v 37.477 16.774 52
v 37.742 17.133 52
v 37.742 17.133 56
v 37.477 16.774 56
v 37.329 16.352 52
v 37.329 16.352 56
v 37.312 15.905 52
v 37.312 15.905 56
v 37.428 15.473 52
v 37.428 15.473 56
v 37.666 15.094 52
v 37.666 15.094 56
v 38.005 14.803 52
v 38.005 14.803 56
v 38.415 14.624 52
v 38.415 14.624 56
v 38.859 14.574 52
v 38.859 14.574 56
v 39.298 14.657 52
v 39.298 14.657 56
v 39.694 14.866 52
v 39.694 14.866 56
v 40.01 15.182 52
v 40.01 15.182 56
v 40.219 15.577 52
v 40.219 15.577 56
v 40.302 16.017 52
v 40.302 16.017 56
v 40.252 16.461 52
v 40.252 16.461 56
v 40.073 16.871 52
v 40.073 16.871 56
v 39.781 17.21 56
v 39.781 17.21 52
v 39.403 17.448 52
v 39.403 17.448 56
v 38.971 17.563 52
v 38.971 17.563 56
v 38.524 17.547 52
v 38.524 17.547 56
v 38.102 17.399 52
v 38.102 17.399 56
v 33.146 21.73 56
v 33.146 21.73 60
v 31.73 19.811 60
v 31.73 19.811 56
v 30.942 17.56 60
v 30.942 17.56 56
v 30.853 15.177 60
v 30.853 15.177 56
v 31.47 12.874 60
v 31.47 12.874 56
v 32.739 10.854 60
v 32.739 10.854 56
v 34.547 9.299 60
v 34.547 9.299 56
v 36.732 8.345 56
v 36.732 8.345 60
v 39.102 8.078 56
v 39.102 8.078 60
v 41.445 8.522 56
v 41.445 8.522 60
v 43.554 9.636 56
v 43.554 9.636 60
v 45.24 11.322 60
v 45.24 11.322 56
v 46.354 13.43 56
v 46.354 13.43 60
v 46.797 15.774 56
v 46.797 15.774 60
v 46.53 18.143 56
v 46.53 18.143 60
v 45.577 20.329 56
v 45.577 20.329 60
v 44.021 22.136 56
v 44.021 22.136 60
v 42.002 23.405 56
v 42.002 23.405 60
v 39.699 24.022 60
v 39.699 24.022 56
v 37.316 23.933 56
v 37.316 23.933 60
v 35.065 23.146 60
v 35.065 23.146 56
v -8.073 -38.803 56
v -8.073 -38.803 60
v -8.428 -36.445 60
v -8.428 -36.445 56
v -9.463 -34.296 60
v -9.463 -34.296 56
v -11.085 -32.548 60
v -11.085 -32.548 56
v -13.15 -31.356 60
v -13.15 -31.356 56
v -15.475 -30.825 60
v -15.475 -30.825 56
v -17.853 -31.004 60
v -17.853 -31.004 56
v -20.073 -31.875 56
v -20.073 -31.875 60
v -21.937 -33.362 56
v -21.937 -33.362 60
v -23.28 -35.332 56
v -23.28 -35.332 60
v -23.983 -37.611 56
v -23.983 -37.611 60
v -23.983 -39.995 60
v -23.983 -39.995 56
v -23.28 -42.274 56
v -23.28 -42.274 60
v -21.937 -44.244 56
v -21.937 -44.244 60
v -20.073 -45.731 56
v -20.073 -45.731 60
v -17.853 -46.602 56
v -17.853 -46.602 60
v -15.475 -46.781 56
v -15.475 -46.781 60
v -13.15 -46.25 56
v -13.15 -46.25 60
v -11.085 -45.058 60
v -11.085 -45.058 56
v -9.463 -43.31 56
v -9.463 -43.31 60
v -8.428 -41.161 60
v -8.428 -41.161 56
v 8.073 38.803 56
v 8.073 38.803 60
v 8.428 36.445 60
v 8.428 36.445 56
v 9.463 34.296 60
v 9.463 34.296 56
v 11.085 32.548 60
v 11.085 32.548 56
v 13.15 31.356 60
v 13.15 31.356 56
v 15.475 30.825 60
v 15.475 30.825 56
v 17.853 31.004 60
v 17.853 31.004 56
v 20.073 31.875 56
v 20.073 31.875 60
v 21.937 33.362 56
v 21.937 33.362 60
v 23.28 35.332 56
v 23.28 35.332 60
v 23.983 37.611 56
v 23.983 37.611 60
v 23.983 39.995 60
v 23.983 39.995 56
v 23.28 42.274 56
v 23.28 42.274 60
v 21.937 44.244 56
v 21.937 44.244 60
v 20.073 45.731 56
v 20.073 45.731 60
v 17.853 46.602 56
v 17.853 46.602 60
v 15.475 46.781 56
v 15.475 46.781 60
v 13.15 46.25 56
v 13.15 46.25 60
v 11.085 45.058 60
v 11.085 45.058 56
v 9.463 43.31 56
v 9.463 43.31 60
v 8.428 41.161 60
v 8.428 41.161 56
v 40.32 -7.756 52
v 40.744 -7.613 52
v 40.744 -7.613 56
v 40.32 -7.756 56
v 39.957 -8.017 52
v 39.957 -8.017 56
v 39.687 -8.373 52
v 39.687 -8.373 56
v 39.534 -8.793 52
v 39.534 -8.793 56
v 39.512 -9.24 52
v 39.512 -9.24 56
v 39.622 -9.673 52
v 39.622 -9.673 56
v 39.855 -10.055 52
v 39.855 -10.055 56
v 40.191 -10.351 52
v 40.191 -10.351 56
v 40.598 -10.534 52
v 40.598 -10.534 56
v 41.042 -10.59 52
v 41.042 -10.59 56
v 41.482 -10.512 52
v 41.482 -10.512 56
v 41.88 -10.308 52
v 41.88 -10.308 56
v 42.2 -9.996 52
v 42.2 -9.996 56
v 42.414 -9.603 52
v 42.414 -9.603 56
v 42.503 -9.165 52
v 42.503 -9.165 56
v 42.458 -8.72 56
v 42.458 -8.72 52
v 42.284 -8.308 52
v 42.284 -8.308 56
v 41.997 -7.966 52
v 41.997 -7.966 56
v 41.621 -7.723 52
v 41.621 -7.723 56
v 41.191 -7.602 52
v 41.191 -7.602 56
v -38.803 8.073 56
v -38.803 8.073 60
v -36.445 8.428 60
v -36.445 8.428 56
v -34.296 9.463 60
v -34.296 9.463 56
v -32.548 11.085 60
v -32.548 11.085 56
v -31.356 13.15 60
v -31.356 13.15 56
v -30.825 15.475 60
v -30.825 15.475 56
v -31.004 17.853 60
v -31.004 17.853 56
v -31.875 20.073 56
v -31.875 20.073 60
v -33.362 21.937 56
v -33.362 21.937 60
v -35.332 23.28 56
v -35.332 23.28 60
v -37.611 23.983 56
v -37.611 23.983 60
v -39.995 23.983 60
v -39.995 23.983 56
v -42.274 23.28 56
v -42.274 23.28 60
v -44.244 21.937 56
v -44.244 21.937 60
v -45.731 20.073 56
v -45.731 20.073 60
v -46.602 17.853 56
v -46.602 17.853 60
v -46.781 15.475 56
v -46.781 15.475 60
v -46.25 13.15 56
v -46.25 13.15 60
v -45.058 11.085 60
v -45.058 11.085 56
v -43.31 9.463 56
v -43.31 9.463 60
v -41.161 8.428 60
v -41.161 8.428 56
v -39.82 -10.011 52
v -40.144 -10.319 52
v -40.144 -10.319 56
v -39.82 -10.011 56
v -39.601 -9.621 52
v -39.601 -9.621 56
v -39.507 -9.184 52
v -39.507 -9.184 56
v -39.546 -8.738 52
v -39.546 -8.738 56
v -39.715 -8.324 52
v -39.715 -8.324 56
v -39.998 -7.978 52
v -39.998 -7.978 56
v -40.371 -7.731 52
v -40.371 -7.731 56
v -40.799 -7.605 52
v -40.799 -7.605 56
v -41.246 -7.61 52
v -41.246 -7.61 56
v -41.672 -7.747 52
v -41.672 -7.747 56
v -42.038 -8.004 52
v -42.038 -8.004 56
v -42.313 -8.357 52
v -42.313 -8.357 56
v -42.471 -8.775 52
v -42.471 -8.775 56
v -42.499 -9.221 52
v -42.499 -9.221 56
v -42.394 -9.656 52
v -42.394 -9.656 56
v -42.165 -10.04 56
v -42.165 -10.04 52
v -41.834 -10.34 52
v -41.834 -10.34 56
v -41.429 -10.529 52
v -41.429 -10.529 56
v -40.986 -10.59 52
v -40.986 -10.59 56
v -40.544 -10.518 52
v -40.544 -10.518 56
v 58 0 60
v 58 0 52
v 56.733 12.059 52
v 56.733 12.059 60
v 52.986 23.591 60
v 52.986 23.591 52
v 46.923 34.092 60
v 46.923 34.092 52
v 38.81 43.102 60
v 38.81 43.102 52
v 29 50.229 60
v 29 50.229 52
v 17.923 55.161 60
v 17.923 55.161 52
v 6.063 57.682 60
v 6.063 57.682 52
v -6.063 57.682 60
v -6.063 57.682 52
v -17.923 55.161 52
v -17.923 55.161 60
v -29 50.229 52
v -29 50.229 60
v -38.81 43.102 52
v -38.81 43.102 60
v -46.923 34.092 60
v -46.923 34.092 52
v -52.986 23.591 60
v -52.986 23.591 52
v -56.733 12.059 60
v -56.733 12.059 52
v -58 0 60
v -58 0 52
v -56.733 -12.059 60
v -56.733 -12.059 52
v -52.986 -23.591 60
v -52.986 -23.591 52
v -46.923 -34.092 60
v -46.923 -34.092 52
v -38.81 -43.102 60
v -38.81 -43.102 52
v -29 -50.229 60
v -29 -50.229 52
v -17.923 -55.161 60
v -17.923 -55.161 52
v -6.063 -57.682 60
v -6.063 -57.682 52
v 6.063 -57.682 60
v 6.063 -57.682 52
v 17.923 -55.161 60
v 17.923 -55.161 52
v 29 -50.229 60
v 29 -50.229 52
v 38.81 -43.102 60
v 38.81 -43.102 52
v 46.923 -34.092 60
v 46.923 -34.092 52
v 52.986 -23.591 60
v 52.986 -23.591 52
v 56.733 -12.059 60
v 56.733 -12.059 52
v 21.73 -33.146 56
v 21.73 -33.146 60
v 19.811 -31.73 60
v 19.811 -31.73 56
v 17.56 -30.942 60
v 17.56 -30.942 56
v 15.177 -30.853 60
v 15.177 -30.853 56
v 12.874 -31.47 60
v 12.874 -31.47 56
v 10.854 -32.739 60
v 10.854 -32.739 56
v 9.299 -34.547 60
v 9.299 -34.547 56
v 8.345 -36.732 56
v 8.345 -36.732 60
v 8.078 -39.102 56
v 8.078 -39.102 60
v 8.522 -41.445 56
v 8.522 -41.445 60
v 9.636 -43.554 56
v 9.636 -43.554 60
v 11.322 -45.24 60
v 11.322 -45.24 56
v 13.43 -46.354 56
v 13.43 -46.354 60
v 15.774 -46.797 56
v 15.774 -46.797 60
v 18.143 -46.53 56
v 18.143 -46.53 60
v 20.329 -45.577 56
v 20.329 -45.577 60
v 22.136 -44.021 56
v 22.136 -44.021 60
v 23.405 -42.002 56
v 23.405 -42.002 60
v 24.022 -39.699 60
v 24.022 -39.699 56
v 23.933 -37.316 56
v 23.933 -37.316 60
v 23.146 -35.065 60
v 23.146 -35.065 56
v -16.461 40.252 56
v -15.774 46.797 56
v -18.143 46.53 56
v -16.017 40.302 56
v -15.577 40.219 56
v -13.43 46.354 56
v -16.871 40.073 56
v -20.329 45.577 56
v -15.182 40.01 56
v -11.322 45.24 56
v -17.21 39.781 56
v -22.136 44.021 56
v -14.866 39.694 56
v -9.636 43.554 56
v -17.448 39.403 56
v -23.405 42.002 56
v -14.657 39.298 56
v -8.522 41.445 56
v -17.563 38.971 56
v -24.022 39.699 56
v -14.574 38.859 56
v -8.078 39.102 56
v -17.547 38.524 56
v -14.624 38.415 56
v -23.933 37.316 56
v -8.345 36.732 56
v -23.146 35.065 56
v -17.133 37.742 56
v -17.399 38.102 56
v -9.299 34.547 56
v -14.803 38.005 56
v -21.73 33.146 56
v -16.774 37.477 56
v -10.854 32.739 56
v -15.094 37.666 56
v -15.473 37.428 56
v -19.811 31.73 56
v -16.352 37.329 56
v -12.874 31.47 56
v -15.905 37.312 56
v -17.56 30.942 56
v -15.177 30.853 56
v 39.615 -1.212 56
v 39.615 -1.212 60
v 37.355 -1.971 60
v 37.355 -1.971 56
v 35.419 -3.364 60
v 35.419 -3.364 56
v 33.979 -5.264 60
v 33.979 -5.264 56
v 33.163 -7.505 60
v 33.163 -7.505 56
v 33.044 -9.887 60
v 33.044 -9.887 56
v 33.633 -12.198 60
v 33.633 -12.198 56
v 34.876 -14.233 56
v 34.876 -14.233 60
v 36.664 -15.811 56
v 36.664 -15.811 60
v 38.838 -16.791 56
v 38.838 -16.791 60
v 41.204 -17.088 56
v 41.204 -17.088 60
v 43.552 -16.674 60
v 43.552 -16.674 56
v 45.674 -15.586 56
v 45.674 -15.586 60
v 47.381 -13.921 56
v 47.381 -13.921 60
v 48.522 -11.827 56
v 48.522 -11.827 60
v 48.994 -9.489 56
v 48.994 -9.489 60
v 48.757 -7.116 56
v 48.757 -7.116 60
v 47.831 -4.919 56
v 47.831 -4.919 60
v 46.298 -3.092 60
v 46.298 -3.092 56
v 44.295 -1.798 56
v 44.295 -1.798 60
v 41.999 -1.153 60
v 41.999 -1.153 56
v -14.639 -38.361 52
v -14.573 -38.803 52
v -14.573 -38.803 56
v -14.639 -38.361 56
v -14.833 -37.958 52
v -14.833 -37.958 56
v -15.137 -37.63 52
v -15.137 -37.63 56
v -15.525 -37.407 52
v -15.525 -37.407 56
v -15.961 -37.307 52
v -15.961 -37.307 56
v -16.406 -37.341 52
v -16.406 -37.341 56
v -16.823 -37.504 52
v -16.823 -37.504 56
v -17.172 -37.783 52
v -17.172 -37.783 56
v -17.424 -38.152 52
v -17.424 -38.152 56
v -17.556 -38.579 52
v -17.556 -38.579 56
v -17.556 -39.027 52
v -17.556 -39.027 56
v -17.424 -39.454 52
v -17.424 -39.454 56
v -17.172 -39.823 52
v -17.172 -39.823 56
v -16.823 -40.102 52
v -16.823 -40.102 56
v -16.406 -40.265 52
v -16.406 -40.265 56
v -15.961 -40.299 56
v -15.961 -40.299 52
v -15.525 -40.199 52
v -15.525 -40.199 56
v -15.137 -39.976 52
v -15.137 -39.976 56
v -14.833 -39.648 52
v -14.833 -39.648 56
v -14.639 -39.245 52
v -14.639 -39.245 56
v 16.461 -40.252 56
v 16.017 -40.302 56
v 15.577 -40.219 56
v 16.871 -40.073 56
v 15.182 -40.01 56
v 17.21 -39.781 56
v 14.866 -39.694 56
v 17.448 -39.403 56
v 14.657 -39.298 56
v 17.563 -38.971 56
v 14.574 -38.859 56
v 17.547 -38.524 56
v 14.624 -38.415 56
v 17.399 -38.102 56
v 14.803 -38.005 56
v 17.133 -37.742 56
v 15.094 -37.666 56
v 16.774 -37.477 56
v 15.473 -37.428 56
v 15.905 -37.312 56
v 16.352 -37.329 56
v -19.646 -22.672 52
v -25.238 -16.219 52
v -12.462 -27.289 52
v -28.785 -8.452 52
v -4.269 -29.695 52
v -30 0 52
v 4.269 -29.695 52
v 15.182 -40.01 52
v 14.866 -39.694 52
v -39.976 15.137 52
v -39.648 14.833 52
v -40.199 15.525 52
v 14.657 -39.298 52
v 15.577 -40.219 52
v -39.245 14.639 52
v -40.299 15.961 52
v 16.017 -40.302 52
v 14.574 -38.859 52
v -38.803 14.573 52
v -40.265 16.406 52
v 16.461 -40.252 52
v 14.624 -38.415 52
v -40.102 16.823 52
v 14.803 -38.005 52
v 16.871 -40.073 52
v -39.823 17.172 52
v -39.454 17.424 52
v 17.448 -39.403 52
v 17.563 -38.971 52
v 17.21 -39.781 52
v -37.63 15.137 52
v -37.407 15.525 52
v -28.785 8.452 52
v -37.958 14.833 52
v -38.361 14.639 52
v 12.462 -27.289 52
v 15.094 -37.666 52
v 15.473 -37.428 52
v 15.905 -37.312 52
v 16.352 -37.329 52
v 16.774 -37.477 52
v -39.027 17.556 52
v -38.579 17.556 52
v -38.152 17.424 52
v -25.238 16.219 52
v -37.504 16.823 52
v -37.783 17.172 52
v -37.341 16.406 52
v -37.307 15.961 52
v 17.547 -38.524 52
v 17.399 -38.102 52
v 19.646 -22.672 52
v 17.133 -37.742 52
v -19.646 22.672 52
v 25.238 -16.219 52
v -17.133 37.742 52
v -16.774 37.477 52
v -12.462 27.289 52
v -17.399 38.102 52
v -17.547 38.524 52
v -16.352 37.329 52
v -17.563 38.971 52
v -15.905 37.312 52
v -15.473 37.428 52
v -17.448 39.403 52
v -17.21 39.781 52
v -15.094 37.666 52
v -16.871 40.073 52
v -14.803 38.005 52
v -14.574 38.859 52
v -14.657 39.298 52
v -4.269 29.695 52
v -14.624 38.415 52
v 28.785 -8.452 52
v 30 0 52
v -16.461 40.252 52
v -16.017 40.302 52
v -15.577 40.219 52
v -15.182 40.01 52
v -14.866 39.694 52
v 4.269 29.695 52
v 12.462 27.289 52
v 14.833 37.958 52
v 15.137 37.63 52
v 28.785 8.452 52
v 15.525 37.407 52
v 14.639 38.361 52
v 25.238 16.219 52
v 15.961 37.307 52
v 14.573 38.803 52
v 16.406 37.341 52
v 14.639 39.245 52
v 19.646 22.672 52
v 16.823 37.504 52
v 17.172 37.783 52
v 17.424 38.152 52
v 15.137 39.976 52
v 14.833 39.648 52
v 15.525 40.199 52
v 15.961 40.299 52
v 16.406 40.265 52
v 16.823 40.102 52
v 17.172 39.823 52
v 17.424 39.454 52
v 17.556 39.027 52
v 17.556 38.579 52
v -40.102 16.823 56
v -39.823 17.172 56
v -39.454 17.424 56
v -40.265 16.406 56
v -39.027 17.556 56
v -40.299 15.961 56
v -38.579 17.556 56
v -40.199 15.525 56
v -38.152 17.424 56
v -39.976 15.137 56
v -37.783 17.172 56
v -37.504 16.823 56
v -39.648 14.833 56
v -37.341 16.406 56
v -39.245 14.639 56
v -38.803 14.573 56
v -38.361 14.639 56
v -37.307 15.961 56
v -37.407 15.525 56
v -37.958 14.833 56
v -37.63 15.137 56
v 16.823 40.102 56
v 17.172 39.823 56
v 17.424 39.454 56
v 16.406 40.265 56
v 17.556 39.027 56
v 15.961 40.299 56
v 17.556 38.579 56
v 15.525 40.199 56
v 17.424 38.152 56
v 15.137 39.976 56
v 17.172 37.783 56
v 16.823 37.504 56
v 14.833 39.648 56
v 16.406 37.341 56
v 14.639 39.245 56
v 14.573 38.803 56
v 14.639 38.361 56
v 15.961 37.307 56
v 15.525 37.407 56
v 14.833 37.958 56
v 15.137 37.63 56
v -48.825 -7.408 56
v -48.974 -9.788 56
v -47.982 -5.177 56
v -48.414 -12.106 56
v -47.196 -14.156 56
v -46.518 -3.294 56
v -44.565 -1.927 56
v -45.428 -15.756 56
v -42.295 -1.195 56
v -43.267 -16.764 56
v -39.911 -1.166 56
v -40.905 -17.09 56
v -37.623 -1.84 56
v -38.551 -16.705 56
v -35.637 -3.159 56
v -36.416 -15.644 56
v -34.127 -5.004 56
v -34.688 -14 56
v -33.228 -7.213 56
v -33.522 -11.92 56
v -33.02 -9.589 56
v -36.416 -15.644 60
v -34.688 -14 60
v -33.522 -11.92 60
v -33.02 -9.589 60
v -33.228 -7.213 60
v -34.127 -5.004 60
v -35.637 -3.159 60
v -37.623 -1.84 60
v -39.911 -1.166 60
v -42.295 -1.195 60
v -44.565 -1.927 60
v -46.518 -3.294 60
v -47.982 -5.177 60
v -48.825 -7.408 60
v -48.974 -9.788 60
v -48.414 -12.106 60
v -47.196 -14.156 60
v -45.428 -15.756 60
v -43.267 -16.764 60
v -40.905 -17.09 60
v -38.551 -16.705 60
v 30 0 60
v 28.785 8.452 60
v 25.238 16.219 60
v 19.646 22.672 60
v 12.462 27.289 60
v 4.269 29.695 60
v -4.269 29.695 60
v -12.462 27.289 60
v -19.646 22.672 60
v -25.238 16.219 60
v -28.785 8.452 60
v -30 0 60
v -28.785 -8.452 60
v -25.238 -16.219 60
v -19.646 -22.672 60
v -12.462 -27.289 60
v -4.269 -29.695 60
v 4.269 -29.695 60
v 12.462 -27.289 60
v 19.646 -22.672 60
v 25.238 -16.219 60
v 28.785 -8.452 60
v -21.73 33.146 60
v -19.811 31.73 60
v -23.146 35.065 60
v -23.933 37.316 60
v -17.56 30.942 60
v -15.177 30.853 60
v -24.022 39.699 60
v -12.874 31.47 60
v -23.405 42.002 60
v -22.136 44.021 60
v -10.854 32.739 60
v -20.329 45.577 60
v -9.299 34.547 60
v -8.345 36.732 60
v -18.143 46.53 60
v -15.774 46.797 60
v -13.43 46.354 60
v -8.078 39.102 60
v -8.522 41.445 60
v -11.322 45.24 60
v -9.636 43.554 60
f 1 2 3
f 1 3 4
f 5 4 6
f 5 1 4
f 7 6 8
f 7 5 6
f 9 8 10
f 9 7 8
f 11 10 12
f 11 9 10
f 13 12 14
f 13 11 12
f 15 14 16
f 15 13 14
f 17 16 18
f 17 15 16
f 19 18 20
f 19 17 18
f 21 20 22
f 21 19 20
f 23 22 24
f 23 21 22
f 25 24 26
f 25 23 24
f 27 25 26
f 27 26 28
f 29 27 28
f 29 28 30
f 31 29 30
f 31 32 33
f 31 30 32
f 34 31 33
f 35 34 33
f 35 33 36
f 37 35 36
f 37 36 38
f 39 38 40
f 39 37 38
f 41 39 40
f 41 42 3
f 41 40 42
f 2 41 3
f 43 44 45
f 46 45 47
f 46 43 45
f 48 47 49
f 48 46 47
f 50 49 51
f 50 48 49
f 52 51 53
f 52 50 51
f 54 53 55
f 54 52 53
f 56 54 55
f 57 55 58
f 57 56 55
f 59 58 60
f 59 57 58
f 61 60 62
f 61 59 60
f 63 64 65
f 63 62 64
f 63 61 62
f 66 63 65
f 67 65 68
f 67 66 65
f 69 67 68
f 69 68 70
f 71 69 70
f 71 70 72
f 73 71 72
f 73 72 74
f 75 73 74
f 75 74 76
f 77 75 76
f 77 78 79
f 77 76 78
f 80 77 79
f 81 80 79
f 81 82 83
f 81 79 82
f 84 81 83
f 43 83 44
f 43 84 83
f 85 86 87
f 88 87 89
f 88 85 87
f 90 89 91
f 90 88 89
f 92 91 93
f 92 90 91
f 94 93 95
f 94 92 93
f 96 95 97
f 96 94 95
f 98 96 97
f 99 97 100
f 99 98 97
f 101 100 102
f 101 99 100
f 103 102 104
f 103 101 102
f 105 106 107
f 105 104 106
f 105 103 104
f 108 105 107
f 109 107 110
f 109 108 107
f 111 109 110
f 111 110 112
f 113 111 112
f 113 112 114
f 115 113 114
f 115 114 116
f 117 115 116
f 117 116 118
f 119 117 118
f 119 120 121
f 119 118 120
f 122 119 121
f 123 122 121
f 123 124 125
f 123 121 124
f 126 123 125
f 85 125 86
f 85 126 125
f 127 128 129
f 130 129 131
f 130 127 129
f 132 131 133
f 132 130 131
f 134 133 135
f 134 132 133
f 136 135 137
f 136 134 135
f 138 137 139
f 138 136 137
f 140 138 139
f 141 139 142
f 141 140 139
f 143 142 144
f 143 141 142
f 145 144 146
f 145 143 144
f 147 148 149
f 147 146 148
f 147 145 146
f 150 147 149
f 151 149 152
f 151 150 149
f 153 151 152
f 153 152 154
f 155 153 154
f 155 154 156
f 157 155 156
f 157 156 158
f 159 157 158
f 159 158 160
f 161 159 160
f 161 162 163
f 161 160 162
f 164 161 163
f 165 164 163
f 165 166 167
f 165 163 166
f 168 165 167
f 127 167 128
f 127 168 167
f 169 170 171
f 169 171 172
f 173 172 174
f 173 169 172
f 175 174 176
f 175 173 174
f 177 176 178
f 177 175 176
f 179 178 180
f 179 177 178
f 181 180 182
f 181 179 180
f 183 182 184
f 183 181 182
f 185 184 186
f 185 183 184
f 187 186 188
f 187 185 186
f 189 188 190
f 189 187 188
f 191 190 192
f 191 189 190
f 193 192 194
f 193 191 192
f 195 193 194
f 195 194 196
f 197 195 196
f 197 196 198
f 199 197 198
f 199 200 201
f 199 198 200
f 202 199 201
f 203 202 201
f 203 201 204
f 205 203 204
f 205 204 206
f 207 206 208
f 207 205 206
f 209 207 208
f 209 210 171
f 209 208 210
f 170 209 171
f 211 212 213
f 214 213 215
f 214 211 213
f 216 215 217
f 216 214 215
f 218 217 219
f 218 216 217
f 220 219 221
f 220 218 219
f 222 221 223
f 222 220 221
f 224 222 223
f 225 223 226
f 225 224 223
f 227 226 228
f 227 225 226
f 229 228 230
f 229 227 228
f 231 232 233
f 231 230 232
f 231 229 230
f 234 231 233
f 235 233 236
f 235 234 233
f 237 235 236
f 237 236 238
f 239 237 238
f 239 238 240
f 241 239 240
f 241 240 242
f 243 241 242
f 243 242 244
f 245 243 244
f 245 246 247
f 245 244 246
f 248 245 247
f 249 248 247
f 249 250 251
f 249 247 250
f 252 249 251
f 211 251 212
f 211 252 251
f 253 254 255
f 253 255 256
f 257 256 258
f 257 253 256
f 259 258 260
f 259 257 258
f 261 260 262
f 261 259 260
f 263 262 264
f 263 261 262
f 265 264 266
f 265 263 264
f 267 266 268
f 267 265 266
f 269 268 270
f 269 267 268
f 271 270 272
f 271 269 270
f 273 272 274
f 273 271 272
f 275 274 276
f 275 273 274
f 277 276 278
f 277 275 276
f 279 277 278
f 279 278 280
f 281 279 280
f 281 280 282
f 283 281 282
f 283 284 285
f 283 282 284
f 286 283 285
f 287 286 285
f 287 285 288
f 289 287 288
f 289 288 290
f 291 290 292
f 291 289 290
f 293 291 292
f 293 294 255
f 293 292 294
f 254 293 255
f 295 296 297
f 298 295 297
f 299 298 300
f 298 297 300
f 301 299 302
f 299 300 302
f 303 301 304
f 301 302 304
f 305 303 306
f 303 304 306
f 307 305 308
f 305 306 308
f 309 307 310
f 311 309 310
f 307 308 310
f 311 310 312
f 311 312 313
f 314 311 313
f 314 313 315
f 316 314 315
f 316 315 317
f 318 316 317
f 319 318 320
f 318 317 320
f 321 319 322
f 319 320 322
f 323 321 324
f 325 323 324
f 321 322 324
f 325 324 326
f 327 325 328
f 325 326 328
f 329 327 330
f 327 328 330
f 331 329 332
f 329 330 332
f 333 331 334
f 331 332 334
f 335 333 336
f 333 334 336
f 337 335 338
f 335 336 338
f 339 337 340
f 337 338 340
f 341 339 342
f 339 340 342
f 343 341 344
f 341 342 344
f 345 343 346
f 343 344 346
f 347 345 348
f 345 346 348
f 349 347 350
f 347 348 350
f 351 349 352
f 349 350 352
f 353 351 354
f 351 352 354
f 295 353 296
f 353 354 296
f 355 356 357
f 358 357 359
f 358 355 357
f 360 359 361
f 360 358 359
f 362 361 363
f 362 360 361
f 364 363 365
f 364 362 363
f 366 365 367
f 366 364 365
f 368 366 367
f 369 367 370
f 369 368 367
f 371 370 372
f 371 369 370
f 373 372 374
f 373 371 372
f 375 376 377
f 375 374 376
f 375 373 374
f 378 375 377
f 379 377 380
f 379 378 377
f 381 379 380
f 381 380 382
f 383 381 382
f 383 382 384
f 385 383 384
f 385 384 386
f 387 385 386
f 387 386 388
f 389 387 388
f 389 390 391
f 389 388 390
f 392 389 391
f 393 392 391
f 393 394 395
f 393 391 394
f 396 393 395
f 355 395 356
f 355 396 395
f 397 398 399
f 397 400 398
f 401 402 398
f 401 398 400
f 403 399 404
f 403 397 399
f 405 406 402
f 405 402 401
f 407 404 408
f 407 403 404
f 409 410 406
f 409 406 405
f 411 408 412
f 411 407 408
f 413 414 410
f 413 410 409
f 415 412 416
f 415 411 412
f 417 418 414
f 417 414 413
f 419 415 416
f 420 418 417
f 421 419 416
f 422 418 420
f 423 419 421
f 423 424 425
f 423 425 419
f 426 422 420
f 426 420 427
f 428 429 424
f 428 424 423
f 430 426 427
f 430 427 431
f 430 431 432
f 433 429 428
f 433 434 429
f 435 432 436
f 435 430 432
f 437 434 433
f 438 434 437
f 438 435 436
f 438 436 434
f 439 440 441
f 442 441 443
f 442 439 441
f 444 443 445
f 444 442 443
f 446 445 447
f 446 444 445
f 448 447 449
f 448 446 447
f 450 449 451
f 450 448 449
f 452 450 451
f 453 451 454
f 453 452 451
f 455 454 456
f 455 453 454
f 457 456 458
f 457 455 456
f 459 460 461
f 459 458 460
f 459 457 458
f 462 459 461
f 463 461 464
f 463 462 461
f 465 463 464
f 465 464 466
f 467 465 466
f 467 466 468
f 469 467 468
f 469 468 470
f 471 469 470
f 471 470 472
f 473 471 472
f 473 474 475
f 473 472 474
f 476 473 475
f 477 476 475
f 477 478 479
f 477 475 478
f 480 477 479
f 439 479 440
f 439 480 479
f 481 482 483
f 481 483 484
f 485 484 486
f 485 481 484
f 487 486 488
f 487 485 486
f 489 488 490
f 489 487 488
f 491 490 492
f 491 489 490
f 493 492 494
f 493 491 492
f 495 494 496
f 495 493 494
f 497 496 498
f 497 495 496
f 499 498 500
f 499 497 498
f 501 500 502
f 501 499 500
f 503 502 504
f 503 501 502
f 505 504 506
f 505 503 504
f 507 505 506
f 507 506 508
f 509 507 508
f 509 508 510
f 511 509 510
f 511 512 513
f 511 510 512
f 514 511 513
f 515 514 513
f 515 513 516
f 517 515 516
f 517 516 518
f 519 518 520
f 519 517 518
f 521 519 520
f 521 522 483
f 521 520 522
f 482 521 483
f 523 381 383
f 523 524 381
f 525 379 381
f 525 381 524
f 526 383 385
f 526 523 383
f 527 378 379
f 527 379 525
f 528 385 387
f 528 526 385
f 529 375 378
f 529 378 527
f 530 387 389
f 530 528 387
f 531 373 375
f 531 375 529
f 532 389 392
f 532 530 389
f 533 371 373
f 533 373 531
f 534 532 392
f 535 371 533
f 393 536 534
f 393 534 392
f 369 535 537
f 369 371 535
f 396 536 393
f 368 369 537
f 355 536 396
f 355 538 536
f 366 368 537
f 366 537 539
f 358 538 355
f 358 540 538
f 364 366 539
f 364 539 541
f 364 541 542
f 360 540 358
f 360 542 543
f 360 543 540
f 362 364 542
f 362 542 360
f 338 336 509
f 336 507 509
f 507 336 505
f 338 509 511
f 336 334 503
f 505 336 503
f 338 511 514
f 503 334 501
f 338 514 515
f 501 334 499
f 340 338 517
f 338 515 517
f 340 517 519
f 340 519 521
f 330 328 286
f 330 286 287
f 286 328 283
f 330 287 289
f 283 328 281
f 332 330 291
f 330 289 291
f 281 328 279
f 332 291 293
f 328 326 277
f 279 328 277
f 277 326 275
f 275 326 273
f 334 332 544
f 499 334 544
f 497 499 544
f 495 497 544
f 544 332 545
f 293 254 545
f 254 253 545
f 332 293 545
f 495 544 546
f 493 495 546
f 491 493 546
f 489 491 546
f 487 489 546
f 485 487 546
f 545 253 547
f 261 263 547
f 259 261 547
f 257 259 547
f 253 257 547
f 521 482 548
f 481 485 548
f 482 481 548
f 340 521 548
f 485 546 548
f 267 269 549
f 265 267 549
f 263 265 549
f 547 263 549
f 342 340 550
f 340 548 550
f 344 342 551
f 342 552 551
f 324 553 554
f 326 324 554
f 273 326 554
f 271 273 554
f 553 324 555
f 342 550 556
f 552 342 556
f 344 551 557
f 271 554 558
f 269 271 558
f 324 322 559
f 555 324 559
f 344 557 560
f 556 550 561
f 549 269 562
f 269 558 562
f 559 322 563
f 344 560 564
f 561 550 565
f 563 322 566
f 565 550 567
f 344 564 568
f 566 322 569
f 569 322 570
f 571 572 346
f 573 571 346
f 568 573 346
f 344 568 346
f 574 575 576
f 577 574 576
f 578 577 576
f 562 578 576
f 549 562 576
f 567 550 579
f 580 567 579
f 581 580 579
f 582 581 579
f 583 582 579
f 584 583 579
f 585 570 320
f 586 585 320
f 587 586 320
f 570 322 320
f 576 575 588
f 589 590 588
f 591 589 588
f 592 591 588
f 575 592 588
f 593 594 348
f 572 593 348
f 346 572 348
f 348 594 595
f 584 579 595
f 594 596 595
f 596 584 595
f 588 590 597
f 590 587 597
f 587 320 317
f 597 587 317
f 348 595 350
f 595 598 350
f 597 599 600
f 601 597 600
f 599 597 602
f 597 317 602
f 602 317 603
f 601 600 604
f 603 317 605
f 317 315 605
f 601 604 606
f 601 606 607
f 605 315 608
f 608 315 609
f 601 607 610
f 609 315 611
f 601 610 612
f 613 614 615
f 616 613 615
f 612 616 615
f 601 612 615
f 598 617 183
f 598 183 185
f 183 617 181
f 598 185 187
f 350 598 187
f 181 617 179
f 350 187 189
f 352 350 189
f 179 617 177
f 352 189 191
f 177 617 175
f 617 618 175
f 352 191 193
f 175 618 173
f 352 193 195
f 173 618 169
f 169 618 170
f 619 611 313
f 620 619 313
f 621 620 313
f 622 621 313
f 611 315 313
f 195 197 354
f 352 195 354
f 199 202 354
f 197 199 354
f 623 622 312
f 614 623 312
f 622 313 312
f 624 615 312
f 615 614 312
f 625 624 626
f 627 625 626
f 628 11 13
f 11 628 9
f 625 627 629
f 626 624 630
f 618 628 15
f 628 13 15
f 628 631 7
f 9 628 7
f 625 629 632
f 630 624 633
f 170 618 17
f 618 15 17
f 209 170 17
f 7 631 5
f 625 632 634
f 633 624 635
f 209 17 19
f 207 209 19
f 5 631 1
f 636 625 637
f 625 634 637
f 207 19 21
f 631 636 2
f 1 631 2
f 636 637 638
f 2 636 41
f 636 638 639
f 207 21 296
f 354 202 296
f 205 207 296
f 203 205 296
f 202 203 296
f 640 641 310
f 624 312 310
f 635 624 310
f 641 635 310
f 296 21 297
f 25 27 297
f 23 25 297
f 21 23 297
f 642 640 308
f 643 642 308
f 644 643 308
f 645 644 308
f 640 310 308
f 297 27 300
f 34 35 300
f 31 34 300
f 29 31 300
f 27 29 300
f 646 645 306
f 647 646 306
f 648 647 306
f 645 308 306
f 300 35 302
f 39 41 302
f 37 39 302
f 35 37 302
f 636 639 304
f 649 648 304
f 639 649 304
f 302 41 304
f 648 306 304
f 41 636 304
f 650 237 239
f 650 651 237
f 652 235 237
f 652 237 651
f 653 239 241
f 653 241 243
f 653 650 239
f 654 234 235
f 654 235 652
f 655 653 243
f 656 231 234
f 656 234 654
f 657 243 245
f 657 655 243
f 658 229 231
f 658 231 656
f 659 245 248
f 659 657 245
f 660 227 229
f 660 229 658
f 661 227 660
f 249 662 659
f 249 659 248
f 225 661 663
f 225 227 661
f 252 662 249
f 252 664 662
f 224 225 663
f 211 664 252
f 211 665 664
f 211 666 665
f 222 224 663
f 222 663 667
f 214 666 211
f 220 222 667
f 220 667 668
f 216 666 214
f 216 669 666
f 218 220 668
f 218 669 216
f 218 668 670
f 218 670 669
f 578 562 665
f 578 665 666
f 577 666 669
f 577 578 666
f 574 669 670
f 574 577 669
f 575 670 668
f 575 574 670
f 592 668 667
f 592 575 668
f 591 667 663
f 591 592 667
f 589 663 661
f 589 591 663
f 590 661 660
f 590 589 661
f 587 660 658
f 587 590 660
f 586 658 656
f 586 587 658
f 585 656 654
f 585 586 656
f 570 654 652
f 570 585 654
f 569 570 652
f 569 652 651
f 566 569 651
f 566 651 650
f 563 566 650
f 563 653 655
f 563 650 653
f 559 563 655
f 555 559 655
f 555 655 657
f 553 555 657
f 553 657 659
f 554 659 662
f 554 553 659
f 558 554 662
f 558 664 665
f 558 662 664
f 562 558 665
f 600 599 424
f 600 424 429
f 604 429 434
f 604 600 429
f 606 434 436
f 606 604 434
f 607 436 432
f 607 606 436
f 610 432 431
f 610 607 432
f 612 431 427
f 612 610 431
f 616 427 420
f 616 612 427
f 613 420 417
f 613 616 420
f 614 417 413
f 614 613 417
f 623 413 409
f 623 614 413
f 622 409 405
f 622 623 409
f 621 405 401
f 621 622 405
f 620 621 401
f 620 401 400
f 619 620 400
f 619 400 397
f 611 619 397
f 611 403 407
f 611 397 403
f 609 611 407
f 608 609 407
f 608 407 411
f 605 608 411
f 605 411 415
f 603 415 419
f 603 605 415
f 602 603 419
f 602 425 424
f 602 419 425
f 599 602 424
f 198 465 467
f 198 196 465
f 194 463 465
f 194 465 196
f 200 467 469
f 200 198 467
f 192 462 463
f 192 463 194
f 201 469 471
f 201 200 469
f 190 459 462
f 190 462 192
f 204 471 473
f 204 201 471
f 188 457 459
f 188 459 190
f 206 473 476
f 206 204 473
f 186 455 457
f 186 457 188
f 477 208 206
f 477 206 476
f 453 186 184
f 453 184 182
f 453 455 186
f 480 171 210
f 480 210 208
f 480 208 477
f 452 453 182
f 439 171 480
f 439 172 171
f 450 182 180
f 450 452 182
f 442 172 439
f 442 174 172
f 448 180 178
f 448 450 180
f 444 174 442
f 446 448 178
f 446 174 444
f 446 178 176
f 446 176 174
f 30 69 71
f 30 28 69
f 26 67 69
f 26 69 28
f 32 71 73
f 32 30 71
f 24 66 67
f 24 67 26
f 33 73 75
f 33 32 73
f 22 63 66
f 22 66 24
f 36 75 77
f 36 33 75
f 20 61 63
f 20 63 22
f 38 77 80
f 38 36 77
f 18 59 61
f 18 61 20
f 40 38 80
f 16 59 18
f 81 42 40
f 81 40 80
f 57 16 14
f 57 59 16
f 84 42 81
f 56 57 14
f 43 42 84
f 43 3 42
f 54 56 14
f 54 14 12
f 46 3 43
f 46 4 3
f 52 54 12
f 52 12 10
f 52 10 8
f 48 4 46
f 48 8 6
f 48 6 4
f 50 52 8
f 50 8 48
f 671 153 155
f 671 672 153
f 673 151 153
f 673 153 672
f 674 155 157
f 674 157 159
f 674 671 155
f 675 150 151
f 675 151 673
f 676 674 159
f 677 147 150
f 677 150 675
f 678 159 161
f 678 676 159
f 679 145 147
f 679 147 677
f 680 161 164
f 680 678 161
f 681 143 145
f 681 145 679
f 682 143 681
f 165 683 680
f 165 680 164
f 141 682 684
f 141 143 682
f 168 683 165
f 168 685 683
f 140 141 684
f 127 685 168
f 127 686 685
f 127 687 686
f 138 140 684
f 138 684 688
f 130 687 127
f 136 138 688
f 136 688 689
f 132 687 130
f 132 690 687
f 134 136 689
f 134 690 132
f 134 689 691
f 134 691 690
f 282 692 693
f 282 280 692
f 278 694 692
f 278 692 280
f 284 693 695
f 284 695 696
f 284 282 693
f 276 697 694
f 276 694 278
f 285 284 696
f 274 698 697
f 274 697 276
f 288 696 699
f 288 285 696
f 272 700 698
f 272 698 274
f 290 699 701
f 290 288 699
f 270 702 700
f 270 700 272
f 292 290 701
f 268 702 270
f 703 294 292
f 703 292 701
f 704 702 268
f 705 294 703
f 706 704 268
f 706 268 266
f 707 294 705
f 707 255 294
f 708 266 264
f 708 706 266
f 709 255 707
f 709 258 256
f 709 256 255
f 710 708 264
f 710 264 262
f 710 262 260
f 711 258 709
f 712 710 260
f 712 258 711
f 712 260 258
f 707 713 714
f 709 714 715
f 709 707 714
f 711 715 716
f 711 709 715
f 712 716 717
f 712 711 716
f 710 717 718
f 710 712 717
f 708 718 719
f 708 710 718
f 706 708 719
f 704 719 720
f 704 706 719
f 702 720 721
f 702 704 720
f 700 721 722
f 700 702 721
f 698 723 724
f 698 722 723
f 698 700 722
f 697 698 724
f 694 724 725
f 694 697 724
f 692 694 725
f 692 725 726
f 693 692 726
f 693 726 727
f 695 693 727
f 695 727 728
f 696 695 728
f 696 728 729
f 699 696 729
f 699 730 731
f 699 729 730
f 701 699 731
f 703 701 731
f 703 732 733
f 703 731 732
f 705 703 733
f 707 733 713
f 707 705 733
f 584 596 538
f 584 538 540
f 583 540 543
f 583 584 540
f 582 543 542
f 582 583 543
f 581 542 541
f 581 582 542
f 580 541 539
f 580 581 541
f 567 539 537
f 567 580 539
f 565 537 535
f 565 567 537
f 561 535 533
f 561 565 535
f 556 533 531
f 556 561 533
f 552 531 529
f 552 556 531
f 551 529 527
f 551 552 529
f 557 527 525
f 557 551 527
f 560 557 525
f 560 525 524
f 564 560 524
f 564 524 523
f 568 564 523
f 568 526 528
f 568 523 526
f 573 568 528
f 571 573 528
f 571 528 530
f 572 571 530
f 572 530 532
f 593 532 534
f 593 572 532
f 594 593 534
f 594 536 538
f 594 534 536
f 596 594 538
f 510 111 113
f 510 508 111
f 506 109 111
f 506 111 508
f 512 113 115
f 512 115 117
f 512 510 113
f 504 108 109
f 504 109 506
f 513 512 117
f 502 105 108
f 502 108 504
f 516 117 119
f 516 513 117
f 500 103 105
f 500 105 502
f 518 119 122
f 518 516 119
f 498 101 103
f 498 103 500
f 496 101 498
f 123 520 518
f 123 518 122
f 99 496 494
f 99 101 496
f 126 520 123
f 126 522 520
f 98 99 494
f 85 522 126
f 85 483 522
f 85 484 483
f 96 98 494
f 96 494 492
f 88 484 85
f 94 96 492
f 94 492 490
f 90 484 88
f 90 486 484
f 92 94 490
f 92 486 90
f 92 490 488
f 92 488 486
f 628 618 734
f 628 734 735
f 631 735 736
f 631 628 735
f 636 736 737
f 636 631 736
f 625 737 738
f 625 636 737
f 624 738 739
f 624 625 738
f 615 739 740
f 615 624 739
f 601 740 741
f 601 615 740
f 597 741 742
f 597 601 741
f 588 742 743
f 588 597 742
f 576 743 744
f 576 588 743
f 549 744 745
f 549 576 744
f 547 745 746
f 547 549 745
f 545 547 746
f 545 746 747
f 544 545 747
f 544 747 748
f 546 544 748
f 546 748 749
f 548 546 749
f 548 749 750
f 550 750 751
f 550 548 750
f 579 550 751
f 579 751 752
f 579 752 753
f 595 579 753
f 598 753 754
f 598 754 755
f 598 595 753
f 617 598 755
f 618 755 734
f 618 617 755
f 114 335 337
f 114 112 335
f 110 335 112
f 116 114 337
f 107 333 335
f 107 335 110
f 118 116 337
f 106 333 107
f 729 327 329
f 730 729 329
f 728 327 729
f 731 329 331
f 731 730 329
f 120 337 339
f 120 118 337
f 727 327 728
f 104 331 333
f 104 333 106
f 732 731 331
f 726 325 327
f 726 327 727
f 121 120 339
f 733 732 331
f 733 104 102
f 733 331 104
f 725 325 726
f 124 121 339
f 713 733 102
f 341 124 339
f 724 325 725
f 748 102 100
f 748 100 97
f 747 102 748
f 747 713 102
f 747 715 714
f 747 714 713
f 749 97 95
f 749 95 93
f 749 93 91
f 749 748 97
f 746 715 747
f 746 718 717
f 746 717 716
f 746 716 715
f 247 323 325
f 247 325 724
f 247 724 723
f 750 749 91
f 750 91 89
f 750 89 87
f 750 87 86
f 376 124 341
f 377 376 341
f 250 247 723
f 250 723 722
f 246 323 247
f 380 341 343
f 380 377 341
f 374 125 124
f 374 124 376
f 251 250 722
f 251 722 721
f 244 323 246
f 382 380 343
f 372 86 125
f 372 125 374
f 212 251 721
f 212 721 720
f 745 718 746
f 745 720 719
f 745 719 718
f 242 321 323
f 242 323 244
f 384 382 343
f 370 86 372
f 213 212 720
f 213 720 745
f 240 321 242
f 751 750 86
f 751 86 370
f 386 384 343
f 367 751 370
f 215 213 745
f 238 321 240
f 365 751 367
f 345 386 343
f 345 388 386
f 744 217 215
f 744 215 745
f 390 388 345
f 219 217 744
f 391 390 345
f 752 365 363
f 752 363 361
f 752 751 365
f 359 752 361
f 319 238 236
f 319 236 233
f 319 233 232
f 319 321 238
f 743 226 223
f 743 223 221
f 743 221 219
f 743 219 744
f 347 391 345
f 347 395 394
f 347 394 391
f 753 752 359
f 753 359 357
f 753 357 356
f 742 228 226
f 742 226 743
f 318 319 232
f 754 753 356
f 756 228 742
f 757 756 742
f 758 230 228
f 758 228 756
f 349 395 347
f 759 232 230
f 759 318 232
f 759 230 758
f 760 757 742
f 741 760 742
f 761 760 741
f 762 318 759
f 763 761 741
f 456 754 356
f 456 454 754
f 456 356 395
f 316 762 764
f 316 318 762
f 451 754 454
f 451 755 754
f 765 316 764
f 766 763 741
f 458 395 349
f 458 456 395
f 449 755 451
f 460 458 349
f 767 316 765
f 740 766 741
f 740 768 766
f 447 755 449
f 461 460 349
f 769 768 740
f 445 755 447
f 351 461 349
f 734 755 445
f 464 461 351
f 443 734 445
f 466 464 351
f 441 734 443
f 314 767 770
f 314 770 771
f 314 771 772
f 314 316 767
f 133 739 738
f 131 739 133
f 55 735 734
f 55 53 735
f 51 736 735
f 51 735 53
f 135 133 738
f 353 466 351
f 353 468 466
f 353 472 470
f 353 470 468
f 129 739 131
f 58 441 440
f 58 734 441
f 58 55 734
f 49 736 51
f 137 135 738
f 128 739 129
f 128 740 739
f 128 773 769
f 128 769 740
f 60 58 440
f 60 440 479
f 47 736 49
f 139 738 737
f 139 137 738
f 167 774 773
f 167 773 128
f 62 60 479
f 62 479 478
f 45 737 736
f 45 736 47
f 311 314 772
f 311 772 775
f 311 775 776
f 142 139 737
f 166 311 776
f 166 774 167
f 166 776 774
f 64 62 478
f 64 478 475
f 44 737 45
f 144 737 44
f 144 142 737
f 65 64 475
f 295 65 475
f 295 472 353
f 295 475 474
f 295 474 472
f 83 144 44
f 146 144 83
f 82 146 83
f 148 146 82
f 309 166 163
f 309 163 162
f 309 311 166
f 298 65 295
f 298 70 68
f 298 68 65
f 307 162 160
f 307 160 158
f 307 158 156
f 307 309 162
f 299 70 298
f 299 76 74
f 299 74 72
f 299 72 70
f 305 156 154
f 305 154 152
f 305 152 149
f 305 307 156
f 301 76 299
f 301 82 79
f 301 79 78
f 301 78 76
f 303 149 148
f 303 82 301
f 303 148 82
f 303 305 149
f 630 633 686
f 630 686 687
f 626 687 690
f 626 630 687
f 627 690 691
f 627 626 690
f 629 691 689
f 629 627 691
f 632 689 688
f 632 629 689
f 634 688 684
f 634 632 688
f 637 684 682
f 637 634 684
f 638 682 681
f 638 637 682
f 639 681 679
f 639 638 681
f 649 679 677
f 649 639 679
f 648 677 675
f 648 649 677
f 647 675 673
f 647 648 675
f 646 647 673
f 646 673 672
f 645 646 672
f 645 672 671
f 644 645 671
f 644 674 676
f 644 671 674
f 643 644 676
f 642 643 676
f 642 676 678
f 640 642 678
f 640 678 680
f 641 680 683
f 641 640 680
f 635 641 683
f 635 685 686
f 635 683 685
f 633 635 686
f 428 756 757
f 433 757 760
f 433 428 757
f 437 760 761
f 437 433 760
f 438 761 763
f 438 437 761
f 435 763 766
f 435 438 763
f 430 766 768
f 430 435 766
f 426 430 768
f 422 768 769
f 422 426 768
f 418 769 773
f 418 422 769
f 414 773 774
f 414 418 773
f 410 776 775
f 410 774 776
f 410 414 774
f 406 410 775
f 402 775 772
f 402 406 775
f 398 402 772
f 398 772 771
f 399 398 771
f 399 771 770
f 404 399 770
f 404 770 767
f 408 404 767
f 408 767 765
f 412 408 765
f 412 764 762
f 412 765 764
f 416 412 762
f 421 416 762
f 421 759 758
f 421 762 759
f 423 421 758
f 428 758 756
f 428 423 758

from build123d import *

# Parameters (mm, degrees)
CYLINDER799_R               = 1.5
CYLINDER799_DEPTH           = 100
CYLINDER799_PLACEMENT_ANGLE = 100
CYLINDER797_R               = 1.5
CYLINDER797_DEPTH           = 100
CYLINDER797_PLACEMENT_ANGLE = 135
CYLINDER801_R               = 1.5
CYLINDER801_DEPTH           = 100
CYLINDER803_R               = 1.5
CYLINDER803_DEPTH           = 100
CYLINDER803_PLACEMENT_ANGLE = 225
CYLINDER796_R               = 1.5
CYLINDER796_DEPTH           = 100
CYLINDER800_R               = 1.5
CYLINDER800_DEPTH           = 100
CYLINDER800_PLACEMENT_ANGLE = 55
CYLINDER798_R               = 1.5
CYLINDER798_DEPTH           = 100
CYLINDER802_R               = 1.5
CYLINDER802_DEPTH           = 100
CYLINDER802_PLACEMENT_ANGLE = 45
CYLINDER766_R               = 8
CYLINDER766_DEPTH           = 20
CYLINDER766_PLACEMENT_ANGLE = 100
CYLINDER765_R               = 8
CYLINDER765_DEPTH           = 20
CYLINDER765_PLACEMENT_ANGLE = 135
CYLINDER767_R               = 8
CYLINDER767_DEPTH           = 20
CYLINDER762_R               = 8
CYLINDER762_DEPTH           = 20
CYLINDER762_PLACEMENT_ANGLE = 225
CYLINDER769_R               = 8
CYLINDER769_DEPTH           = 20
CYLINDER764_R               = 8
CYLINDER764_DEPTH           = 20
CYLINDER764_PLACEMENT_ANGLE = 55
CYLINDER763_R               = 8
CYLINDER763_DEPTH           = 20
CYLINDER768_R               = 8
CYLINDER768_DEPTH           = 20
CYLINDER768_PLACEMENT_ANGLE = 45
TUBE082_R                   = 58
TUBE082_R_2                 = 30
TUBE082_DEPTH               = 8


with BuildPart() as v_lec799:
    # Cylinder799 → Cylinder799 (new body)
    with BuildSketch(Plane.XY):
        Circle(CYLINDER799_R)
    extrude(amount=CYLINDER799_DEPTH)


with BuildPart() as v_lec799_1:
    # Cylinder799 placement: moved
    add(v_lec799.part.moved(Location((41.004432, -9.090464, 0))).rotate(Axis((41.004432, -9.090464, 0), (0, 0, 1)), CYLINDER799_PLACEMENT_ANGLE))


with BuildPart() as v_lec797:
    # Cylinder797 → Cylinder797 (new body)
    with BuildSketch(Plane.XY):
        Circle(CYLINDER797_R)
    extrude(amount=CYLINDER797_DEPTH)


with BuildPart() as v_lec797_1:
    # Cylinder797 placement: moved
    add(v_lec797.part.moved(Location((38.80294, 16.072704, 0))).rotate(Axis((38.80294, 16.072704, 0), (0, 0, 1)), CYLINDER797_PLACEMENT_ANGLE))


with BuildPart() as v_lec801:
    # Cylinder801 → Cylinder801 (new body)
    with BuildSketch(Plane(origin=(16.072704, 38.80294, 0), x_dir=(-1, 0, 0), z_dir=(0, 0, 1))):
        Circle(CYLINDER801_R)
    extrude(amount=CYLINDER801_DEPTH)


with BuildPart() as v_lec803:
    # Cylinder803 → Cylinder803 (new body)
    with BuildSketch(Plane.XY):
        Circle(CYLINDER803_R)
    extrude(amount=CYLINDER803_DEPTH)


with BuildPart() as v_lec803_1:
    # Cylinder803 placement: moved
    add(v_lec803.part.moved(Location((-16.072704, 38.80294, 0))).rotate(Axis((-16.072704, 38.80294, 0), (0, 0, 1)), CYLINDER803_PLACEMENT_ANGLE))


with BuildPart() as v_lec796:
    # Cylinder796 → Cylinder796 (new body)
    with BuildSketch(Plane(origin=(-38.80294, 16.072704, 0), x_dir=(0, -1, 0), z_dir=(0, 0, 1))):
        Circle(CYLINDER796_R)
    extrude(amount=CYLINDER796_DEPTH)


with BuildPart() as v_lec800:
    # Cylinder800 → Cylinder800 (new body)
    with BuildSketch(Plane.XY):
        Circle(CYLINDER800_R)
    extrude(amount=CYLINDER800_DEPTH)


with BuildPart() as v_lec800_1:
    # Cylinder800 placement: moved
    add(v_lec800.part.moved(Location((-41.004432, -9.090464, 0))).rotate(Axis((-41.004432, -9.090464, 0), (0, 0, -1)), CYLINDER800_PLACEMENT_ANGLE))


with BuildPart() as v_lec798:
    # Cylinder798 → Cylinder798 (new body)
    with BuildSketch(Plane(origin=(-16.072704, -38.80294, 0), x_dir=(1, 0, 0), z_dir=(0, 0, 1))):
        Circle(CYLINDER798_R)
    extrude(amount=CYLINDER798_DEPTH)


with BuildPart() as compound716:
    # Cylinder802 → Cylinder802 (new body)
    with BuildSketch(Plane.XY):
        Circle(CYLINDER802_R)
    extrude(amount=CYLINDER802_DEPTH)


with BuildPart() as compound716_1:
    # Cylinder802 placement: moved
    add(compound716.part.moved(Location((16.072704, -38.80294, 0))).rotate(Axis((16.072704, -38.80294, 0), (0, 0, 1)), CYLINDER802_PLACEMENT_ANGLE))

    # Compound716: union Válec799, Válec797, Válec801, Válec803, Válec796, Válec800, Válec798
    add(v_lec799_1.part)
    add(v_lec797_1.part)
    add(v_lec801.part)
    add(v_lec803_1.part)
    add(v_lec796.part)
    add(v_lec800_1.part)
    add(v_lec798.part)


with BuildPart() as v_lec766:
    # Cylinder766 → Cylinder766 (new body)
    with BuildSketch(Plane.XY):
        Circle(CYLINDER766_R)
    extrude(amount=CYLINDER766_DEPTH)


with BuildPart() as v_lec766_1:
    # Cylinder766 placement: moved
    add(v_lec766.part.moved(Location((41.004432, -9.090464, 0))).rotate(Axis((41.004432, -9.090464, 0), (0, 0, 1)), CYLINDER766_PLACEMENT_ANGLE))


with BuildPart() as v_lec765:
    # Cylinder765 → Cylinder765 (new body)
    with BuildSketch(Plane.XY):
        Circle(CYLINDER765_R)
    extrude(amount=CYLINDER765_DEPTH)


with BuildPart() as v_lec765_1:
    # Cylinder765 placement: moved
    add(v_lec765.part.moved(Location((38.80294, 16.072704, 0))).rotate(Axis((38.80294, 16.072704, 0), (0, 0, 1)), CYLINDER765_PLACEMENT_ANGLE))


with BuildPart() as v_lec767:
    # Cylinder767 → Cylinder767 (new body)
    with BuildSketch(Plane(origin=(16.072704, 38.80294, 0), x_dir=(-1, 0, 0), z_dir=(0, 0, 1))):
        Circle(CYLINDER767_R)
    extrude(amount=CYLINDER767_DEPTH)


with BuildPart() as v_lec762:
    # Cylinder762 → Cylinder762 (new body)
    with BuildSketch(Plane.XY):
        Circle(CYLINDER762_R)
    extrude(amount=CYLINDER762_DEPTH)


with BuildPart() as v_lec762_1:
    # Cylinder762 placement: moved
    add(v_lec762.part.moved(Location((-16.072704, 38.80294, 0))).rotate(Axis((-16.072704, 38.80294, 0), (0, 0, 1)), CYLINDER762_PLACEMENT_ANGLE))


with BuildPart() as v_lec769:
    # Cylinder769 → Cylinder769 (new body)
    with BuildSketch(Plane(origin=(-38.80294, 16.072704, 0), x_dir=(0, -1, 0), z_dir=(0, 0, 1))):
        Circle(CYLINDER769_R)
    extrude(amount=CYLINDER769_DEPTH)


with BuildPart() as v_lec764:
    # Cylinder764 → Cylinder764 (new body)
    with BuildSketch(Plane.XY):
        Circle(CYLINDER764_R)
    extrude(amount=CYLINDER764_DEPTH)


with BuildPart() as v_lec764_1:
    # Cylinder764 placement: moved
    add(v_lec764.part.moved(Location((-41.004432, -9.090464, 0))).rotate(Axis((-41.004432, -9.090464, 0), (0, 0, -1)), CYLINDER764_PLACEMENT_ANGLE))


with BuildPart() as v_lec763:
    # Cylinder763 → Cylinder763 (new body)
    with BuildSketch(Plane(origin=(-16.072704, -38.80294, 0), x_dir=(1, 0, 0), z_dir=(0, 0, 1))):
        Circle(CYLINDER763_R)
    extrude(amount=CYLINDER763_DEPTH)


with BuildPart() as compound710:
    # Cylinder768 → Cylinder768 (new body)
    with BuildSketch(Plane.XY):
        Circle(CYLINDER768_R)
    extrude(amount=CYLINDER768_DEPTH)


with BuildPart() as compound710_1:
    # Cylinder768 placement: moved
    add(compound710.part.moved(Location((16.072704, -38.80294, 0))).rotate(Axis((16.072704, -38.80294, 0), (0, 0, 1)), CYLINDER768_PLACEMENT_ANGLE))

    # Compound710: union Válec766, Válec765, Válec767, Válec762, Válec769, Válec764, Válec763
    add(v_lec766_1.part)
    add(v_lec765_1.part)
    add(v_lec767.part)
    add(v_lec762_1.part)
    add(v_lec769.part)
    add(v_lec764_1.part)
    add(v_lec763.part)


with BuildPart() as compound710_2:
    # Compound710 placement: moved
    add(compound710_1.part.moved(Location((0, 0, 56))))


with BuildPart() as cut333:
    # Tube082 → Tube082 (new body)
    with BuildSketch(Plane.XY.offset(52)):
        Circle(TUBE082_R)
        Circle(TUBE082_R_2, mode=Mode.SUBTRACT)
    extrude(amount=TUBE082_DEPTH)

    # Cut332: cut Compound710
    add(compound710_2.part, mode=Mode.SUBTRACT)

    # Cut333: cut Compound716
    add(compound716_1.part, mode=Mode.SUBTRACT)


solid = cut333.part
